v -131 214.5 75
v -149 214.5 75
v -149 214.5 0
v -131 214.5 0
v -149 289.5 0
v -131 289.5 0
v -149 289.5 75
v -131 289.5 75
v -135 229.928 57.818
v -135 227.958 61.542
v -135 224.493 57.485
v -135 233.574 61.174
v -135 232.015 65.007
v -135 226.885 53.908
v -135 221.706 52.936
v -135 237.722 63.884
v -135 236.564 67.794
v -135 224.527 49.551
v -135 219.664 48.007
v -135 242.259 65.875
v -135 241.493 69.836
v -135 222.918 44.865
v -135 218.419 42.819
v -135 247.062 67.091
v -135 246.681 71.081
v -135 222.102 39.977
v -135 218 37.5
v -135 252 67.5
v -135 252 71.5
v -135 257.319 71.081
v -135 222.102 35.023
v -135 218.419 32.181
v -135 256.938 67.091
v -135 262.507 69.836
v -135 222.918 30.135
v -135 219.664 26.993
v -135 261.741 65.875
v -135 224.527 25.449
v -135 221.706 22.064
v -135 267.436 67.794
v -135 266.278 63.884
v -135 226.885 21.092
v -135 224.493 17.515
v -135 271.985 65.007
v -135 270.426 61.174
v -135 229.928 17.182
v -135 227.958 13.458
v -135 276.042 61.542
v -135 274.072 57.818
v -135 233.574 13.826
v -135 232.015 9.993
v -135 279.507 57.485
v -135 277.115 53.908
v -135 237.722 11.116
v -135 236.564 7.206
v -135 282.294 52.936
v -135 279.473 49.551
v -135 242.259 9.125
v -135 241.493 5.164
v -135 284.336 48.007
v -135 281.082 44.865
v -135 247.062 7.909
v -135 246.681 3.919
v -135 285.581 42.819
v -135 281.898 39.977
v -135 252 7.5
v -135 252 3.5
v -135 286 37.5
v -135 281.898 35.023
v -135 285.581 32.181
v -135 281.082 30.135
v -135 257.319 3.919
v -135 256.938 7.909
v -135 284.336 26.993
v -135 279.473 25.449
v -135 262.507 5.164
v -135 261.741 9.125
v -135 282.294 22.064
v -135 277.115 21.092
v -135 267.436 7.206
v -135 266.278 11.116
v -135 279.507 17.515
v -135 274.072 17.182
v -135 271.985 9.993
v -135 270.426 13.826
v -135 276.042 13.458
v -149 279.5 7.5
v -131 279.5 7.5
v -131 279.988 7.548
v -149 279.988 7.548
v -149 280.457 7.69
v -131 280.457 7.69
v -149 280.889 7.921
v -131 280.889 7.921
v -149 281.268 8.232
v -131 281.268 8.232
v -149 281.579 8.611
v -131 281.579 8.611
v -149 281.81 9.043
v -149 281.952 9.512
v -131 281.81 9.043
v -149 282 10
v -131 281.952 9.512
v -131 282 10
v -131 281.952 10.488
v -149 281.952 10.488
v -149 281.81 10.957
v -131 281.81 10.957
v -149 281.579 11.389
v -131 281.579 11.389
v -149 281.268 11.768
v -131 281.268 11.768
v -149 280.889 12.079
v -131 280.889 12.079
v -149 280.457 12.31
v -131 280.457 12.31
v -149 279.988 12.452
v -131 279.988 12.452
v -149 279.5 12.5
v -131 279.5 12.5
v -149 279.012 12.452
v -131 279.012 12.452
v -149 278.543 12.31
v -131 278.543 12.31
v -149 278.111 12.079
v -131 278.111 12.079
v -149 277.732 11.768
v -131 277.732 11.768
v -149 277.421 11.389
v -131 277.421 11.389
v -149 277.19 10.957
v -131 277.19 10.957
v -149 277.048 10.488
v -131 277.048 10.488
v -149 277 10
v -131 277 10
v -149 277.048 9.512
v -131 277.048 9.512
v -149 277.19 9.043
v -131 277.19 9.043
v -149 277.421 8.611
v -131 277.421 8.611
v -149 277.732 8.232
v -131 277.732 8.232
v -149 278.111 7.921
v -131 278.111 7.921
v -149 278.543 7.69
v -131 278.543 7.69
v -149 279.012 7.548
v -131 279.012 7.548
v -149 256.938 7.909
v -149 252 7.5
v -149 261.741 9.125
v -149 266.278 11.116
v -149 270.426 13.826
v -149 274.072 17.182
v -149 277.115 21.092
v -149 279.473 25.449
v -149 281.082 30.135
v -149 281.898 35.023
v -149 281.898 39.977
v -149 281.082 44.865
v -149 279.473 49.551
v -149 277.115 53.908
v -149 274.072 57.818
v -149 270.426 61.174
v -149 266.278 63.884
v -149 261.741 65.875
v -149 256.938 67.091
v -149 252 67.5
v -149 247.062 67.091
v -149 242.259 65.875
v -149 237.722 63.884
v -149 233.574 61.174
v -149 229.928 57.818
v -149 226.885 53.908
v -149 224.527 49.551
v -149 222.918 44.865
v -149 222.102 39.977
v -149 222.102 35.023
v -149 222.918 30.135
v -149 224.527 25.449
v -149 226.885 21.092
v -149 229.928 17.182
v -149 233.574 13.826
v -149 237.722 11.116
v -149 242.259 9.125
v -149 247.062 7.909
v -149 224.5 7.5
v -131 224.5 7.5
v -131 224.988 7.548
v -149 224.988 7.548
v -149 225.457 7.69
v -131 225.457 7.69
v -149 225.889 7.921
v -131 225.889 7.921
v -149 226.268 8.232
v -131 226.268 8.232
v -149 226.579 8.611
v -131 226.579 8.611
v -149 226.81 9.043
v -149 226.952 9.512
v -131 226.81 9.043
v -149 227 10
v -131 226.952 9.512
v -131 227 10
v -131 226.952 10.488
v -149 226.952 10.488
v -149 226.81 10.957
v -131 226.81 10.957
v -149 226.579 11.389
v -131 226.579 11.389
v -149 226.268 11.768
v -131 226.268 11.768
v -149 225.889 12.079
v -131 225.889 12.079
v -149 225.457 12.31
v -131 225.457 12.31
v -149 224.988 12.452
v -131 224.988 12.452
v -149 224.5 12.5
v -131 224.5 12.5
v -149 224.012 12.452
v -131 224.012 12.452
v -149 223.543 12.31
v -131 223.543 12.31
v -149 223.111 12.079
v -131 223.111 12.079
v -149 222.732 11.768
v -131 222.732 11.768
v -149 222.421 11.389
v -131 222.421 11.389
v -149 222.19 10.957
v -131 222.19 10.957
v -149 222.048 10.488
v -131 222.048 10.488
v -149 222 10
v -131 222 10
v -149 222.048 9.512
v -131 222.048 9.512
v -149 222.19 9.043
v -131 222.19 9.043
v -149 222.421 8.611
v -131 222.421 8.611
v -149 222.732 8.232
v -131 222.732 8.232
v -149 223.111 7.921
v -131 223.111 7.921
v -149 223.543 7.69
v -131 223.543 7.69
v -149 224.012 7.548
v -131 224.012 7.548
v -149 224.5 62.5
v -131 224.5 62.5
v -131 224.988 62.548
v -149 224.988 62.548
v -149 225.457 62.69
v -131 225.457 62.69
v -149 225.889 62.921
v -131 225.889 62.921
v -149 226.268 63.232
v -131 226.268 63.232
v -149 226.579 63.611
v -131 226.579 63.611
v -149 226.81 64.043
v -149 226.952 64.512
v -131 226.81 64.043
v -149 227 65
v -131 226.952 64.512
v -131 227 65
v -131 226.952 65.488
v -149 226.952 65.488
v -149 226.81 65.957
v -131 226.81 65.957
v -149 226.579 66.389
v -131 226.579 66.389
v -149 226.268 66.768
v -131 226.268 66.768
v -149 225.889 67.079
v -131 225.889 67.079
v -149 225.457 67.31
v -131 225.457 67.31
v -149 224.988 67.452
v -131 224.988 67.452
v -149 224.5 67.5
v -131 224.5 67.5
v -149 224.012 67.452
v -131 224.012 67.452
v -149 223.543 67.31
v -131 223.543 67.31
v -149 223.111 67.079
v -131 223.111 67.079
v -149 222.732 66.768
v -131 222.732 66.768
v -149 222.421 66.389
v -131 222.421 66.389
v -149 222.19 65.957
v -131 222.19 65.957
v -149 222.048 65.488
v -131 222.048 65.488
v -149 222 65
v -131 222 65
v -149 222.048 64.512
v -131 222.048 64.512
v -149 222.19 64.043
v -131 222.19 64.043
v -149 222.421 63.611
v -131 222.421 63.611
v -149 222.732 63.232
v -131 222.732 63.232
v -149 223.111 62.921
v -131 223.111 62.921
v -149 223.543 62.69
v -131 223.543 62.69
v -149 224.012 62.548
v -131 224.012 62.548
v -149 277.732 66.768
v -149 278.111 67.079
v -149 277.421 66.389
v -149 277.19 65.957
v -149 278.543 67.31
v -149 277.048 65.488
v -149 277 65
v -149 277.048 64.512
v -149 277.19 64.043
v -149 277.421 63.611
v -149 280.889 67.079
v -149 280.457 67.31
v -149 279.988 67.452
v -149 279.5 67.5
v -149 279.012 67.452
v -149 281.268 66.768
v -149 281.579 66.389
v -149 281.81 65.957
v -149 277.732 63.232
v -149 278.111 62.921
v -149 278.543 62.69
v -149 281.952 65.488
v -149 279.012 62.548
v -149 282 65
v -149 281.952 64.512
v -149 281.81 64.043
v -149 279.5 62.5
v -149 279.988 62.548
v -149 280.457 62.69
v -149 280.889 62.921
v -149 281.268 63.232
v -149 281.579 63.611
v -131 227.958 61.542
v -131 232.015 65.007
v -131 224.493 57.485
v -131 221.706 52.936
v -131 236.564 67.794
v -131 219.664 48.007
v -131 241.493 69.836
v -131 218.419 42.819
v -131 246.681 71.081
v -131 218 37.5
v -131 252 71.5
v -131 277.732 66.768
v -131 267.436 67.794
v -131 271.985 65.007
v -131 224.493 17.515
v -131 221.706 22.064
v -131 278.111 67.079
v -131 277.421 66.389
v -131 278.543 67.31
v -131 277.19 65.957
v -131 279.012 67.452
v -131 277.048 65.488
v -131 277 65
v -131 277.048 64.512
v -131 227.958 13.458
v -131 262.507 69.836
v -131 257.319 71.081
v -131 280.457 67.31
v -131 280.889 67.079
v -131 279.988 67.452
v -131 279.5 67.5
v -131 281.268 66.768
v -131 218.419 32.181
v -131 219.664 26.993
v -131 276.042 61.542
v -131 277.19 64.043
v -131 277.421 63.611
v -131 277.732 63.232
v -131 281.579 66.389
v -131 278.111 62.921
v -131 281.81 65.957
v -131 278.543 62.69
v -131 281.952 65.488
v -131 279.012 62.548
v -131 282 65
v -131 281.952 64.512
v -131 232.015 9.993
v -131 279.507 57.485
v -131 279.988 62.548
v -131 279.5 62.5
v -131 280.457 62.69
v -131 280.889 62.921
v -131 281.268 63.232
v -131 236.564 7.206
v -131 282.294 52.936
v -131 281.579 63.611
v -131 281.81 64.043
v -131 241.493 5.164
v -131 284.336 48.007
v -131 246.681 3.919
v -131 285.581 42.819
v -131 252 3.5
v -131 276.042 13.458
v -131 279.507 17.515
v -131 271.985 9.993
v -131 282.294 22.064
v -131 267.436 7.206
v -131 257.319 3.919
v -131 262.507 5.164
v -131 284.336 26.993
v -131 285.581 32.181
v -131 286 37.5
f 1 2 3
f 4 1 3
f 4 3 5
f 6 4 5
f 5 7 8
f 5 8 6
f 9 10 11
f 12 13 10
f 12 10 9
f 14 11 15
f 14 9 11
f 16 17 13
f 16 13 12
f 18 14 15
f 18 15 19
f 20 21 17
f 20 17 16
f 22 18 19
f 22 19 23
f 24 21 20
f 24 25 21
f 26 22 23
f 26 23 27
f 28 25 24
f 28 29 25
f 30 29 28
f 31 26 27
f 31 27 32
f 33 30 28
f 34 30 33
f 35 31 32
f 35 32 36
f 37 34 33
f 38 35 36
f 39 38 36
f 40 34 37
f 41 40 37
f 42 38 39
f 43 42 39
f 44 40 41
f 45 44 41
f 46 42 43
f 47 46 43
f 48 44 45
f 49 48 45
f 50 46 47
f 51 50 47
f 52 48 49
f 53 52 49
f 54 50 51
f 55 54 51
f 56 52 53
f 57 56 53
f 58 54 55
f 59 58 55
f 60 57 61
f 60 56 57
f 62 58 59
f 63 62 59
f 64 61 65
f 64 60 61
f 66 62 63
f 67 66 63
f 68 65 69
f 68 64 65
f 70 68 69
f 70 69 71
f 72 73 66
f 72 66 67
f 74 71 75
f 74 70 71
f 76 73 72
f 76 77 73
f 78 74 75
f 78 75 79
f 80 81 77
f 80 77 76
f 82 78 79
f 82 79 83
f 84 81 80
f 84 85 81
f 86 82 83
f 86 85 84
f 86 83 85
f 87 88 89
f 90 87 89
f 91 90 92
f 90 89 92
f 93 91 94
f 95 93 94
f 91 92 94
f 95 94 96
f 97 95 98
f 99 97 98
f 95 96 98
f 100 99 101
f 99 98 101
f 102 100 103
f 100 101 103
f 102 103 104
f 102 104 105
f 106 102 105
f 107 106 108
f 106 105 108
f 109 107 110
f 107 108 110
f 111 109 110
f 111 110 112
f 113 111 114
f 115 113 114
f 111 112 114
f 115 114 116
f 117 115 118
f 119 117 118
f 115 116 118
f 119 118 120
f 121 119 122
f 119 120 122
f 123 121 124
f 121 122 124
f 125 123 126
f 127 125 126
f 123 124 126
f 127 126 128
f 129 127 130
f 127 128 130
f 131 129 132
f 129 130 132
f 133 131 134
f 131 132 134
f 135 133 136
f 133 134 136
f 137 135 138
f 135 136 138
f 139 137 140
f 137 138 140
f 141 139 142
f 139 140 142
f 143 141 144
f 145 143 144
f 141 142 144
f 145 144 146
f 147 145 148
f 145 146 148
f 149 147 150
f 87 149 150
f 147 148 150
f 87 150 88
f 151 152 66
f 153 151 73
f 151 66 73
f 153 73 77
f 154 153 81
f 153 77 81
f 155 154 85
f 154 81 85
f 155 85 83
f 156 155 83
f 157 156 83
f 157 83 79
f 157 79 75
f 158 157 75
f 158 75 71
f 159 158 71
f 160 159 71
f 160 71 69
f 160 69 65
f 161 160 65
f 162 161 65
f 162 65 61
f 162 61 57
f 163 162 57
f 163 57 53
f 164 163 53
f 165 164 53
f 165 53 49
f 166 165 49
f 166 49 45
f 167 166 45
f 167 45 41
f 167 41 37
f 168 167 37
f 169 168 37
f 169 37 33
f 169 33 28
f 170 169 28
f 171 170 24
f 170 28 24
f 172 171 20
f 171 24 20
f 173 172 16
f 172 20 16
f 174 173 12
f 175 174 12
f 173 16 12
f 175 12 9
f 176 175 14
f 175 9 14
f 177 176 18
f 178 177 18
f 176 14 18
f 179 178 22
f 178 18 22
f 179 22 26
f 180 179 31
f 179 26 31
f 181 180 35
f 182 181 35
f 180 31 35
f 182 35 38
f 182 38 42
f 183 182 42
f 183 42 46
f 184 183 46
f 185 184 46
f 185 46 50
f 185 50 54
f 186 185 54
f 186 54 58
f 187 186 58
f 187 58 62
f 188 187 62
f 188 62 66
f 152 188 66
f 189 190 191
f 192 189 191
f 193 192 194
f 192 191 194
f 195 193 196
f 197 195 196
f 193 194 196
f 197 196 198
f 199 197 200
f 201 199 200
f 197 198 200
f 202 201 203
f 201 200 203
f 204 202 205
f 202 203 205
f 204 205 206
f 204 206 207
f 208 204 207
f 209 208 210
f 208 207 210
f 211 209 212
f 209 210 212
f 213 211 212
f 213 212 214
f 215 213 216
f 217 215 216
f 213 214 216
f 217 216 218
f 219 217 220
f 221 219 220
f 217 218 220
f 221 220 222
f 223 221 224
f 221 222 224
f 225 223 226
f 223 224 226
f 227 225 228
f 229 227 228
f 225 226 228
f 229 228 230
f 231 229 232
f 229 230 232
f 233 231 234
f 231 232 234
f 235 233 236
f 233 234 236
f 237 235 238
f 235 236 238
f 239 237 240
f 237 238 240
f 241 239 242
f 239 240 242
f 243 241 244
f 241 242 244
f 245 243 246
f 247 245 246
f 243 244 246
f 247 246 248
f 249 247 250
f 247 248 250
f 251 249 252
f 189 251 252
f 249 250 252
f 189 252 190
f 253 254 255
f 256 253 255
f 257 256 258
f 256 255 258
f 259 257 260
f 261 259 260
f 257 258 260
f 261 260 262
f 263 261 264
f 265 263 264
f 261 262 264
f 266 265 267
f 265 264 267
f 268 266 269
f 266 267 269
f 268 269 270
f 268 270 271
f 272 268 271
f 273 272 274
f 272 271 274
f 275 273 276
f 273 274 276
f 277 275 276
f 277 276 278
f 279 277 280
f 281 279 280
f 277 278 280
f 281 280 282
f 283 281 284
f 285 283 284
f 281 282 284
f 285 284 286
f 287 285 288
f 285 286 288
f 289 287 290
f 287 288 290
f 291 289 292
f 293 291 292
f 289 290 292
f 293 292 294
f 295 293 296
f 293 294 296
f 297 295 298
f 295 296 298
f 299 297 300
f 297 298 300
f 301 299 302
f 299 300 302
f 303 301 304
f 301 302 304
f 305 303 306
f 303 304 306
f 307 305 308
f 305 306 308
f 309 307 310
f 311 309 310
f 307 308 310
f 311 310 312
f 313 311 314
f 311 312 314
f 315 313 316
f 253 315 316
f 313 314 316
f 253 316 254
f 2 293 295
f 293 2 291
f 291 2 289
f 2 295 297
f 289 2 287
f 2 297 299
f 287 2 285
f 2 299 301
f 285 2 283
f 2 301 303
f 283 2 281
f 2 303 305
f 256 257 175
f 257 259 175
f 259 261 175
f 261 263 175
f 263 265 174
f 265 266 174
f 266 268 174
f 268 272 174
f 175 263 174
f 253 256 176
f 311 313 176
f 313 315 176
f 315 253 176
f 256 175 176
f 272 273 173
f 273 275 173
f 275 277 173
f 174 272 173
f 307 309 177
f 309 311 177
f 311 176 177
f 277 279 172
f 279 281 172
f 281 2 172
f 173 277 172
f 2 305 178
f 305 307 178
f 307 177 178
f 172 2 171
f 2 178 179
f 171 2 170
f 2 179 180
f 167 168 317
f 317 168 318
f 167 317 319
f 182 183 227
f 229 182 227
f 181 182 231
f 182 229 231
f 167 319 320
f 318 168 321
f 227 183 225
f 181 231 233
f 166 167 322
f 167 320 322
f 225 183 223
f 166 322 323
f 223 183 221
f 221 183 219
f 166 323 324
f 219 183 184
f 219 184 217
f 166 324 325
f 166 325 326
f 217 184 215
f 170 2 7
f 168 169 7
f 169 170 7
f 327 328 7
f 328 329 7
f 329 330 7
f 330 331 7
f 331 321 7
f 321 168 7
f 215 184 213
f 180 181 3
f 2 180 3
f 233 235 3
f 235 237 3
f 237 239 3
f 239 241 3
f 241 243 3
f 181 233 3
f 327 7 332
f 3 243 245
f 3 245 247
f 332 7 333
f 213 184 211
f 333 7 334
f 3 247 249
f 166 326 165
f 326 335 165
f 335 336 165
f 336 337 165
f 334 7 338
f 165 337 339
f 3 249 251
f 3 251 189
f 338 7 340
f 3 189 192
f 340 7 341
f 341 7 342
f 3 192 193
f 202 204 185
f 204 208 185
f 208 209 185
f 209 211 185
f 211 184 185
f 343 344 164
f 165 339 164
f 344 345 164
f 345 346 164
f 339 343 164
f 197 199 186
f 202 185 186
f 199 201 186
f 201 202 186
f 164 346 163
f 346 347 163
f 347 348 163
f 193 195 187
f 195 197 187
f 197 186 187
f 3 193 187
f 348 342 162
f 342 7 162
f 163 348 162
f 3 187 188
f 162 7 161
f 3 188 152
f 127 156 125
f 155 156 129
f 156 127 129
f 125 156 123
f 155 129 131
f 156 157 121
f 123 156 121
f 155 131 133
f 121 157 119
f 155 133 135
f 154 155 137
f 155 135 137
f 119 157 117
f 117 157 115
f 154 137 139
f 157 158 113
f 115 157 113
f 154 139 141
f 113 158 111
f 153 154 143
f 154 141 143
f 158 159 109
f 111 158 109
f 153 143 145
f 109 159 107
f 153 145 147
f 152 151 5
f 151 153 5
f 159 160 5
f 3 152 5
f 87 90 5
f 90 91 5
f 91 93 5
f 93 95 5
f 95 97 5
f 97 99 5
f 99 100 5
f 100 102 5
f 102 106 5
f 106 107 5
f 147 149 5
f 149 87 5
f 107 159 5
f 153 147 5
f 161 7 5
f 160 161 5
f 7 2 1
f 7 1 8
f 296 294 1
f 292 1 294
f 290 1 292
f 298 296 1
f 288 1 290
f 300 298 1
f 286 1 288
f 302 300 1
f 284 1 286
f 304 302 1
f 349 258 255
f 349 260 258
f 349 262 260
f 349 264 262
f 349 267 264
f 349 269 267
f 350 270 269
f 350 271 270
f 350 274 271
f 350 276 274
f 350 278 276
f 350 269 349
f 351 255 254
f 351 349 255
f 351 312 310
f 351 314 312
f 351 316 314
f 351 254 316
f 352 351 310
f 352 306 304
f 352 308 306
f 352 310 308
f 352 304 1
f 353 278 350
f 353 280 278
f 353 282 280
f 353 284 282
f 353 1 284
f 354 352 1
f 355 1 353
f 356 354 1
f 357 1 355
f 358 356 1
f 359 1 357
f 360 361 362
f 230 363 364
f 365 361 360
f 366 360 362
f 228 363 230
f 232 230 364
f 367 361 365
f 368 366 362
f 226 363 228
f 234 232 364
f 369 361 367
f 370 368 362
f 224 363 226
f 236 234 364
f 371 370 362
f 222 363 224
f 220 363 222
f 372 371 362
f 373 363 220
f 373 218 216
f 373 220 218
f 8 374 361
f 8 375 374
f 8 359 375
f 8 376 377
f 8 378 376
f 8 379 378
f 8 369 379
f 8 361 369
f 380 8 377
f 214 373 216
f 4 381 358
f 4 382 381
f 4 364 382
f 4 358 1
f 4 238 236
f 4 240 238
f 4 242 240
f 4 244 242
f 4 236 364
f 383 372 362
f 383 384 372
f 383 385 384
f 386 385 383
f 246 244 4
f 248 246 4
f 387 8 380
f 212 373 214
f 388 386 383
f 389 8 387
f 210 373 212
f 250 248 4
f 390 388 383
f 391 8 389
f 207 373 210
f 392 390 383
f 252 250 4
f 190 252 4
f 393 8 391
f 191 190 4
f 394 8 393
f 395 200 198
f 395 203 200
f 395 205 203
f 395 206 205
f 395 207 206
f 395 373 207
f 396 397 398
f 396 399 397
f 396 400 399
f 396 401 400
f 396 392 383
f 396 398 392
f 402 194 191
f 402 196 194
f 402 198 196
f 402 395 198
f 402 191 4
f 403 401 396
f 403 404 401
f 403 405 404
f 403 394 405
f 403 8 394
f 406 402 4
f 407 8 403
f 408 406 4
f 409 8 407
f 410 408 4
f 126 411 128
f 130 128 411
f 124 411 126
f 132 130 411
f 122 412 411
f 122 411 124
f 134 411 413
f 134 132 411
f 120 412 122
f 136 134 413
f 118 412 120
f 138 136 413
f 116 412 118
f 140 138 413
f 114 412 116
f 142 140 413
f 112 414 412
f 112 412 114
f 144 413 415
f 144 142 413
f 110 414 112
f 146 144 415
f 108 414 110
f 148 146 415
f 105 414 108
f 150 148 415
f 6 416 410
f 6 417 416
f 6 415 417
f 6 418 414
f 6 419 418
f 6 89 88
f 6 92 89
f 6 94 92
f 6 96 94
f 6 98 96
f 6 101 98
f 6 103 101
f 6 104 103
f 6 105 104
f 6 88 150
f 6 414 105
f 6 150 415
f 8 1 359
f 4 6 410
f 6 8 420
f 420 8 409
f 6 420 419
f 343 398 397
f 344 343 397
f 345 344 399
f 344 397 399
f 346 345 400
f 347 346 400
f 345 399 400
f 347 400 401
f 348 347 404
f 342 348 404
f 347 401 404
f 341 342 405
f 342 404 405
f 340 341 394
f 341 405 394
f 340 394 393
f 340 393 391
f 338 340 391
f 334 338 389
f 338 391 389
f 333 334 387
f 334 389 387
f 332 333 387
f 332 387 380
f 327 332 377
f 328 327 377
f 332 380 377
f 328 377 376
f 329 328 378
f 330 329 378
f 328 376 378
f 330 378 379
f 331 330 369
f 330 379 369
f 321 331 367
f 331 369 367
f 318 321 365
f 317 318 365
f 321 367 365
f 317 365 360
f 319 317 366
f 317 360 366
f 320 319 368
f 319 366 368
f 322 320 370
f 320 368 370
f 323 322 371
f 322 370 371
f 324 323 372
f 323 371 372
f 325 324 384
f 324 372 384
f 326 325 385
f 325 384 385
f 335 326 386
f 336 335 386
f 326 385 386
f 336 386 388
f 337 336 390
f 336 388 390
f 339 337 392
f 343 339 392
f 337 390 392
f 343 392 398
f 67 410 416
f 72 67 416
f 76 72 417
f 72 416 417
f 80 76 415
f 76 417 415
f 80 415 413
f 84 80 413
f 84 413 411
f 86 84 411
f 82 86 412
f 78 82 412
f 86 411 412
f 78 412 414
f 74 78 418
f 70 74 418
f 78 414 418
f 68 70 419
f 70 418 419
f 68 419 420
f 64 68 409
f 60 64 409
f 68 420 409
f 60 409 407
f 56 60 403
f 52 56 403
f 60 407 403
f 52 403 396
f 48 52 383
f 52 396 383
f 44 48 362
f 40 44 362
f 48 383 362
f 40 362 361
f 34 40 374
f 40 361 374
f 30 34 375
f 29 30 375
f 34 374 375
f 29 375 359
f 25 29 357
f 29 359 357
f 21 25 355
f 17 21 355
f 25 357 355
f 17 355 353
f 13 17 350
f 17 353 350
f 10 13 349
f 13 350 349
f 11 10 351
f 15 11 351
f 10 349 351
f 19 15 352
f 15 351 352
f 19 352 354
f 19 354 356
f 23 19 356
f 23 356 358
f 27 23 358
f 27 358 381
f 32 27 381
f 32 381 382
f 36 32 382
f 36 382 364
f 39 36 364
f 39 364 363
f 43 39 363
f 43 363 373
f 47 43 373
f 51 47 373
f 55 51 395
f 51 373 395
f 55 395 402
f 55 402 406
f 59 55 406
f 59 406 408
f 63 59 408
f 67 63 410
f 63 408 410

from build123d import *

# Parameters (mm, degrees)
SKETCH033_W             = 75
SKETCH033_H             = 75
PAD011_DEPTH            = 18
SKETCH034_R             = 30
SKETCH034_R_2           = 2.5
POCKET022_DEPTH         = 18
SKETCH035_R             = 34
POCKET023_DEPTH         = 4
BODY012_PLACEMENT_ANGLE = 90


with BuildPart() as part:
    # Sketch033 → Pad011 (new body)
    with BuildSketch(Plane.XY):
        Rectangle(SKETCH033_W, SKETCH033_H)
    extrude(amount=PAD011_DEPTH)

    # Sketch034 → Pocket022 (cut)
    with BuildSketch(Plane.XY.offset(18)):
        Circle(SKETCH034_R)
        with Locations((-27.5, 27.5)):
            Circle(SKETCH034_R_2)
        with Locations((27.5, 27.5)):
            Circle(SKETCH034_R_2)
        with Locations((27.5, -27.5)):
            Circle(SKETCH034_R_2)
        with Locations((-27.5, -27.5)):
            Circle(SKETCH034_R_2)
    extrude(amount=-POCKET022_DEPTH, mode=Mode.SUBTRACT)

    # Sketch035 → Pocket023 (cut)
    with BuildSketch(Plane.XY.offset(18)):
        Circle(SKETCH035_R)
    extrude(amount=-POCKET023_DEPTH, mode=Mode.SUBTRACT)


with BuildPart() as part_1:
    # Body012 placement: moved
    add(part.part.moved(Location((-149, 252, 37.5))).rotate(Axis((-149, 252, 37.5), (0, 1, 0)), BODY012_PLACEMENT_ANGLE))


solid = part_1.part
